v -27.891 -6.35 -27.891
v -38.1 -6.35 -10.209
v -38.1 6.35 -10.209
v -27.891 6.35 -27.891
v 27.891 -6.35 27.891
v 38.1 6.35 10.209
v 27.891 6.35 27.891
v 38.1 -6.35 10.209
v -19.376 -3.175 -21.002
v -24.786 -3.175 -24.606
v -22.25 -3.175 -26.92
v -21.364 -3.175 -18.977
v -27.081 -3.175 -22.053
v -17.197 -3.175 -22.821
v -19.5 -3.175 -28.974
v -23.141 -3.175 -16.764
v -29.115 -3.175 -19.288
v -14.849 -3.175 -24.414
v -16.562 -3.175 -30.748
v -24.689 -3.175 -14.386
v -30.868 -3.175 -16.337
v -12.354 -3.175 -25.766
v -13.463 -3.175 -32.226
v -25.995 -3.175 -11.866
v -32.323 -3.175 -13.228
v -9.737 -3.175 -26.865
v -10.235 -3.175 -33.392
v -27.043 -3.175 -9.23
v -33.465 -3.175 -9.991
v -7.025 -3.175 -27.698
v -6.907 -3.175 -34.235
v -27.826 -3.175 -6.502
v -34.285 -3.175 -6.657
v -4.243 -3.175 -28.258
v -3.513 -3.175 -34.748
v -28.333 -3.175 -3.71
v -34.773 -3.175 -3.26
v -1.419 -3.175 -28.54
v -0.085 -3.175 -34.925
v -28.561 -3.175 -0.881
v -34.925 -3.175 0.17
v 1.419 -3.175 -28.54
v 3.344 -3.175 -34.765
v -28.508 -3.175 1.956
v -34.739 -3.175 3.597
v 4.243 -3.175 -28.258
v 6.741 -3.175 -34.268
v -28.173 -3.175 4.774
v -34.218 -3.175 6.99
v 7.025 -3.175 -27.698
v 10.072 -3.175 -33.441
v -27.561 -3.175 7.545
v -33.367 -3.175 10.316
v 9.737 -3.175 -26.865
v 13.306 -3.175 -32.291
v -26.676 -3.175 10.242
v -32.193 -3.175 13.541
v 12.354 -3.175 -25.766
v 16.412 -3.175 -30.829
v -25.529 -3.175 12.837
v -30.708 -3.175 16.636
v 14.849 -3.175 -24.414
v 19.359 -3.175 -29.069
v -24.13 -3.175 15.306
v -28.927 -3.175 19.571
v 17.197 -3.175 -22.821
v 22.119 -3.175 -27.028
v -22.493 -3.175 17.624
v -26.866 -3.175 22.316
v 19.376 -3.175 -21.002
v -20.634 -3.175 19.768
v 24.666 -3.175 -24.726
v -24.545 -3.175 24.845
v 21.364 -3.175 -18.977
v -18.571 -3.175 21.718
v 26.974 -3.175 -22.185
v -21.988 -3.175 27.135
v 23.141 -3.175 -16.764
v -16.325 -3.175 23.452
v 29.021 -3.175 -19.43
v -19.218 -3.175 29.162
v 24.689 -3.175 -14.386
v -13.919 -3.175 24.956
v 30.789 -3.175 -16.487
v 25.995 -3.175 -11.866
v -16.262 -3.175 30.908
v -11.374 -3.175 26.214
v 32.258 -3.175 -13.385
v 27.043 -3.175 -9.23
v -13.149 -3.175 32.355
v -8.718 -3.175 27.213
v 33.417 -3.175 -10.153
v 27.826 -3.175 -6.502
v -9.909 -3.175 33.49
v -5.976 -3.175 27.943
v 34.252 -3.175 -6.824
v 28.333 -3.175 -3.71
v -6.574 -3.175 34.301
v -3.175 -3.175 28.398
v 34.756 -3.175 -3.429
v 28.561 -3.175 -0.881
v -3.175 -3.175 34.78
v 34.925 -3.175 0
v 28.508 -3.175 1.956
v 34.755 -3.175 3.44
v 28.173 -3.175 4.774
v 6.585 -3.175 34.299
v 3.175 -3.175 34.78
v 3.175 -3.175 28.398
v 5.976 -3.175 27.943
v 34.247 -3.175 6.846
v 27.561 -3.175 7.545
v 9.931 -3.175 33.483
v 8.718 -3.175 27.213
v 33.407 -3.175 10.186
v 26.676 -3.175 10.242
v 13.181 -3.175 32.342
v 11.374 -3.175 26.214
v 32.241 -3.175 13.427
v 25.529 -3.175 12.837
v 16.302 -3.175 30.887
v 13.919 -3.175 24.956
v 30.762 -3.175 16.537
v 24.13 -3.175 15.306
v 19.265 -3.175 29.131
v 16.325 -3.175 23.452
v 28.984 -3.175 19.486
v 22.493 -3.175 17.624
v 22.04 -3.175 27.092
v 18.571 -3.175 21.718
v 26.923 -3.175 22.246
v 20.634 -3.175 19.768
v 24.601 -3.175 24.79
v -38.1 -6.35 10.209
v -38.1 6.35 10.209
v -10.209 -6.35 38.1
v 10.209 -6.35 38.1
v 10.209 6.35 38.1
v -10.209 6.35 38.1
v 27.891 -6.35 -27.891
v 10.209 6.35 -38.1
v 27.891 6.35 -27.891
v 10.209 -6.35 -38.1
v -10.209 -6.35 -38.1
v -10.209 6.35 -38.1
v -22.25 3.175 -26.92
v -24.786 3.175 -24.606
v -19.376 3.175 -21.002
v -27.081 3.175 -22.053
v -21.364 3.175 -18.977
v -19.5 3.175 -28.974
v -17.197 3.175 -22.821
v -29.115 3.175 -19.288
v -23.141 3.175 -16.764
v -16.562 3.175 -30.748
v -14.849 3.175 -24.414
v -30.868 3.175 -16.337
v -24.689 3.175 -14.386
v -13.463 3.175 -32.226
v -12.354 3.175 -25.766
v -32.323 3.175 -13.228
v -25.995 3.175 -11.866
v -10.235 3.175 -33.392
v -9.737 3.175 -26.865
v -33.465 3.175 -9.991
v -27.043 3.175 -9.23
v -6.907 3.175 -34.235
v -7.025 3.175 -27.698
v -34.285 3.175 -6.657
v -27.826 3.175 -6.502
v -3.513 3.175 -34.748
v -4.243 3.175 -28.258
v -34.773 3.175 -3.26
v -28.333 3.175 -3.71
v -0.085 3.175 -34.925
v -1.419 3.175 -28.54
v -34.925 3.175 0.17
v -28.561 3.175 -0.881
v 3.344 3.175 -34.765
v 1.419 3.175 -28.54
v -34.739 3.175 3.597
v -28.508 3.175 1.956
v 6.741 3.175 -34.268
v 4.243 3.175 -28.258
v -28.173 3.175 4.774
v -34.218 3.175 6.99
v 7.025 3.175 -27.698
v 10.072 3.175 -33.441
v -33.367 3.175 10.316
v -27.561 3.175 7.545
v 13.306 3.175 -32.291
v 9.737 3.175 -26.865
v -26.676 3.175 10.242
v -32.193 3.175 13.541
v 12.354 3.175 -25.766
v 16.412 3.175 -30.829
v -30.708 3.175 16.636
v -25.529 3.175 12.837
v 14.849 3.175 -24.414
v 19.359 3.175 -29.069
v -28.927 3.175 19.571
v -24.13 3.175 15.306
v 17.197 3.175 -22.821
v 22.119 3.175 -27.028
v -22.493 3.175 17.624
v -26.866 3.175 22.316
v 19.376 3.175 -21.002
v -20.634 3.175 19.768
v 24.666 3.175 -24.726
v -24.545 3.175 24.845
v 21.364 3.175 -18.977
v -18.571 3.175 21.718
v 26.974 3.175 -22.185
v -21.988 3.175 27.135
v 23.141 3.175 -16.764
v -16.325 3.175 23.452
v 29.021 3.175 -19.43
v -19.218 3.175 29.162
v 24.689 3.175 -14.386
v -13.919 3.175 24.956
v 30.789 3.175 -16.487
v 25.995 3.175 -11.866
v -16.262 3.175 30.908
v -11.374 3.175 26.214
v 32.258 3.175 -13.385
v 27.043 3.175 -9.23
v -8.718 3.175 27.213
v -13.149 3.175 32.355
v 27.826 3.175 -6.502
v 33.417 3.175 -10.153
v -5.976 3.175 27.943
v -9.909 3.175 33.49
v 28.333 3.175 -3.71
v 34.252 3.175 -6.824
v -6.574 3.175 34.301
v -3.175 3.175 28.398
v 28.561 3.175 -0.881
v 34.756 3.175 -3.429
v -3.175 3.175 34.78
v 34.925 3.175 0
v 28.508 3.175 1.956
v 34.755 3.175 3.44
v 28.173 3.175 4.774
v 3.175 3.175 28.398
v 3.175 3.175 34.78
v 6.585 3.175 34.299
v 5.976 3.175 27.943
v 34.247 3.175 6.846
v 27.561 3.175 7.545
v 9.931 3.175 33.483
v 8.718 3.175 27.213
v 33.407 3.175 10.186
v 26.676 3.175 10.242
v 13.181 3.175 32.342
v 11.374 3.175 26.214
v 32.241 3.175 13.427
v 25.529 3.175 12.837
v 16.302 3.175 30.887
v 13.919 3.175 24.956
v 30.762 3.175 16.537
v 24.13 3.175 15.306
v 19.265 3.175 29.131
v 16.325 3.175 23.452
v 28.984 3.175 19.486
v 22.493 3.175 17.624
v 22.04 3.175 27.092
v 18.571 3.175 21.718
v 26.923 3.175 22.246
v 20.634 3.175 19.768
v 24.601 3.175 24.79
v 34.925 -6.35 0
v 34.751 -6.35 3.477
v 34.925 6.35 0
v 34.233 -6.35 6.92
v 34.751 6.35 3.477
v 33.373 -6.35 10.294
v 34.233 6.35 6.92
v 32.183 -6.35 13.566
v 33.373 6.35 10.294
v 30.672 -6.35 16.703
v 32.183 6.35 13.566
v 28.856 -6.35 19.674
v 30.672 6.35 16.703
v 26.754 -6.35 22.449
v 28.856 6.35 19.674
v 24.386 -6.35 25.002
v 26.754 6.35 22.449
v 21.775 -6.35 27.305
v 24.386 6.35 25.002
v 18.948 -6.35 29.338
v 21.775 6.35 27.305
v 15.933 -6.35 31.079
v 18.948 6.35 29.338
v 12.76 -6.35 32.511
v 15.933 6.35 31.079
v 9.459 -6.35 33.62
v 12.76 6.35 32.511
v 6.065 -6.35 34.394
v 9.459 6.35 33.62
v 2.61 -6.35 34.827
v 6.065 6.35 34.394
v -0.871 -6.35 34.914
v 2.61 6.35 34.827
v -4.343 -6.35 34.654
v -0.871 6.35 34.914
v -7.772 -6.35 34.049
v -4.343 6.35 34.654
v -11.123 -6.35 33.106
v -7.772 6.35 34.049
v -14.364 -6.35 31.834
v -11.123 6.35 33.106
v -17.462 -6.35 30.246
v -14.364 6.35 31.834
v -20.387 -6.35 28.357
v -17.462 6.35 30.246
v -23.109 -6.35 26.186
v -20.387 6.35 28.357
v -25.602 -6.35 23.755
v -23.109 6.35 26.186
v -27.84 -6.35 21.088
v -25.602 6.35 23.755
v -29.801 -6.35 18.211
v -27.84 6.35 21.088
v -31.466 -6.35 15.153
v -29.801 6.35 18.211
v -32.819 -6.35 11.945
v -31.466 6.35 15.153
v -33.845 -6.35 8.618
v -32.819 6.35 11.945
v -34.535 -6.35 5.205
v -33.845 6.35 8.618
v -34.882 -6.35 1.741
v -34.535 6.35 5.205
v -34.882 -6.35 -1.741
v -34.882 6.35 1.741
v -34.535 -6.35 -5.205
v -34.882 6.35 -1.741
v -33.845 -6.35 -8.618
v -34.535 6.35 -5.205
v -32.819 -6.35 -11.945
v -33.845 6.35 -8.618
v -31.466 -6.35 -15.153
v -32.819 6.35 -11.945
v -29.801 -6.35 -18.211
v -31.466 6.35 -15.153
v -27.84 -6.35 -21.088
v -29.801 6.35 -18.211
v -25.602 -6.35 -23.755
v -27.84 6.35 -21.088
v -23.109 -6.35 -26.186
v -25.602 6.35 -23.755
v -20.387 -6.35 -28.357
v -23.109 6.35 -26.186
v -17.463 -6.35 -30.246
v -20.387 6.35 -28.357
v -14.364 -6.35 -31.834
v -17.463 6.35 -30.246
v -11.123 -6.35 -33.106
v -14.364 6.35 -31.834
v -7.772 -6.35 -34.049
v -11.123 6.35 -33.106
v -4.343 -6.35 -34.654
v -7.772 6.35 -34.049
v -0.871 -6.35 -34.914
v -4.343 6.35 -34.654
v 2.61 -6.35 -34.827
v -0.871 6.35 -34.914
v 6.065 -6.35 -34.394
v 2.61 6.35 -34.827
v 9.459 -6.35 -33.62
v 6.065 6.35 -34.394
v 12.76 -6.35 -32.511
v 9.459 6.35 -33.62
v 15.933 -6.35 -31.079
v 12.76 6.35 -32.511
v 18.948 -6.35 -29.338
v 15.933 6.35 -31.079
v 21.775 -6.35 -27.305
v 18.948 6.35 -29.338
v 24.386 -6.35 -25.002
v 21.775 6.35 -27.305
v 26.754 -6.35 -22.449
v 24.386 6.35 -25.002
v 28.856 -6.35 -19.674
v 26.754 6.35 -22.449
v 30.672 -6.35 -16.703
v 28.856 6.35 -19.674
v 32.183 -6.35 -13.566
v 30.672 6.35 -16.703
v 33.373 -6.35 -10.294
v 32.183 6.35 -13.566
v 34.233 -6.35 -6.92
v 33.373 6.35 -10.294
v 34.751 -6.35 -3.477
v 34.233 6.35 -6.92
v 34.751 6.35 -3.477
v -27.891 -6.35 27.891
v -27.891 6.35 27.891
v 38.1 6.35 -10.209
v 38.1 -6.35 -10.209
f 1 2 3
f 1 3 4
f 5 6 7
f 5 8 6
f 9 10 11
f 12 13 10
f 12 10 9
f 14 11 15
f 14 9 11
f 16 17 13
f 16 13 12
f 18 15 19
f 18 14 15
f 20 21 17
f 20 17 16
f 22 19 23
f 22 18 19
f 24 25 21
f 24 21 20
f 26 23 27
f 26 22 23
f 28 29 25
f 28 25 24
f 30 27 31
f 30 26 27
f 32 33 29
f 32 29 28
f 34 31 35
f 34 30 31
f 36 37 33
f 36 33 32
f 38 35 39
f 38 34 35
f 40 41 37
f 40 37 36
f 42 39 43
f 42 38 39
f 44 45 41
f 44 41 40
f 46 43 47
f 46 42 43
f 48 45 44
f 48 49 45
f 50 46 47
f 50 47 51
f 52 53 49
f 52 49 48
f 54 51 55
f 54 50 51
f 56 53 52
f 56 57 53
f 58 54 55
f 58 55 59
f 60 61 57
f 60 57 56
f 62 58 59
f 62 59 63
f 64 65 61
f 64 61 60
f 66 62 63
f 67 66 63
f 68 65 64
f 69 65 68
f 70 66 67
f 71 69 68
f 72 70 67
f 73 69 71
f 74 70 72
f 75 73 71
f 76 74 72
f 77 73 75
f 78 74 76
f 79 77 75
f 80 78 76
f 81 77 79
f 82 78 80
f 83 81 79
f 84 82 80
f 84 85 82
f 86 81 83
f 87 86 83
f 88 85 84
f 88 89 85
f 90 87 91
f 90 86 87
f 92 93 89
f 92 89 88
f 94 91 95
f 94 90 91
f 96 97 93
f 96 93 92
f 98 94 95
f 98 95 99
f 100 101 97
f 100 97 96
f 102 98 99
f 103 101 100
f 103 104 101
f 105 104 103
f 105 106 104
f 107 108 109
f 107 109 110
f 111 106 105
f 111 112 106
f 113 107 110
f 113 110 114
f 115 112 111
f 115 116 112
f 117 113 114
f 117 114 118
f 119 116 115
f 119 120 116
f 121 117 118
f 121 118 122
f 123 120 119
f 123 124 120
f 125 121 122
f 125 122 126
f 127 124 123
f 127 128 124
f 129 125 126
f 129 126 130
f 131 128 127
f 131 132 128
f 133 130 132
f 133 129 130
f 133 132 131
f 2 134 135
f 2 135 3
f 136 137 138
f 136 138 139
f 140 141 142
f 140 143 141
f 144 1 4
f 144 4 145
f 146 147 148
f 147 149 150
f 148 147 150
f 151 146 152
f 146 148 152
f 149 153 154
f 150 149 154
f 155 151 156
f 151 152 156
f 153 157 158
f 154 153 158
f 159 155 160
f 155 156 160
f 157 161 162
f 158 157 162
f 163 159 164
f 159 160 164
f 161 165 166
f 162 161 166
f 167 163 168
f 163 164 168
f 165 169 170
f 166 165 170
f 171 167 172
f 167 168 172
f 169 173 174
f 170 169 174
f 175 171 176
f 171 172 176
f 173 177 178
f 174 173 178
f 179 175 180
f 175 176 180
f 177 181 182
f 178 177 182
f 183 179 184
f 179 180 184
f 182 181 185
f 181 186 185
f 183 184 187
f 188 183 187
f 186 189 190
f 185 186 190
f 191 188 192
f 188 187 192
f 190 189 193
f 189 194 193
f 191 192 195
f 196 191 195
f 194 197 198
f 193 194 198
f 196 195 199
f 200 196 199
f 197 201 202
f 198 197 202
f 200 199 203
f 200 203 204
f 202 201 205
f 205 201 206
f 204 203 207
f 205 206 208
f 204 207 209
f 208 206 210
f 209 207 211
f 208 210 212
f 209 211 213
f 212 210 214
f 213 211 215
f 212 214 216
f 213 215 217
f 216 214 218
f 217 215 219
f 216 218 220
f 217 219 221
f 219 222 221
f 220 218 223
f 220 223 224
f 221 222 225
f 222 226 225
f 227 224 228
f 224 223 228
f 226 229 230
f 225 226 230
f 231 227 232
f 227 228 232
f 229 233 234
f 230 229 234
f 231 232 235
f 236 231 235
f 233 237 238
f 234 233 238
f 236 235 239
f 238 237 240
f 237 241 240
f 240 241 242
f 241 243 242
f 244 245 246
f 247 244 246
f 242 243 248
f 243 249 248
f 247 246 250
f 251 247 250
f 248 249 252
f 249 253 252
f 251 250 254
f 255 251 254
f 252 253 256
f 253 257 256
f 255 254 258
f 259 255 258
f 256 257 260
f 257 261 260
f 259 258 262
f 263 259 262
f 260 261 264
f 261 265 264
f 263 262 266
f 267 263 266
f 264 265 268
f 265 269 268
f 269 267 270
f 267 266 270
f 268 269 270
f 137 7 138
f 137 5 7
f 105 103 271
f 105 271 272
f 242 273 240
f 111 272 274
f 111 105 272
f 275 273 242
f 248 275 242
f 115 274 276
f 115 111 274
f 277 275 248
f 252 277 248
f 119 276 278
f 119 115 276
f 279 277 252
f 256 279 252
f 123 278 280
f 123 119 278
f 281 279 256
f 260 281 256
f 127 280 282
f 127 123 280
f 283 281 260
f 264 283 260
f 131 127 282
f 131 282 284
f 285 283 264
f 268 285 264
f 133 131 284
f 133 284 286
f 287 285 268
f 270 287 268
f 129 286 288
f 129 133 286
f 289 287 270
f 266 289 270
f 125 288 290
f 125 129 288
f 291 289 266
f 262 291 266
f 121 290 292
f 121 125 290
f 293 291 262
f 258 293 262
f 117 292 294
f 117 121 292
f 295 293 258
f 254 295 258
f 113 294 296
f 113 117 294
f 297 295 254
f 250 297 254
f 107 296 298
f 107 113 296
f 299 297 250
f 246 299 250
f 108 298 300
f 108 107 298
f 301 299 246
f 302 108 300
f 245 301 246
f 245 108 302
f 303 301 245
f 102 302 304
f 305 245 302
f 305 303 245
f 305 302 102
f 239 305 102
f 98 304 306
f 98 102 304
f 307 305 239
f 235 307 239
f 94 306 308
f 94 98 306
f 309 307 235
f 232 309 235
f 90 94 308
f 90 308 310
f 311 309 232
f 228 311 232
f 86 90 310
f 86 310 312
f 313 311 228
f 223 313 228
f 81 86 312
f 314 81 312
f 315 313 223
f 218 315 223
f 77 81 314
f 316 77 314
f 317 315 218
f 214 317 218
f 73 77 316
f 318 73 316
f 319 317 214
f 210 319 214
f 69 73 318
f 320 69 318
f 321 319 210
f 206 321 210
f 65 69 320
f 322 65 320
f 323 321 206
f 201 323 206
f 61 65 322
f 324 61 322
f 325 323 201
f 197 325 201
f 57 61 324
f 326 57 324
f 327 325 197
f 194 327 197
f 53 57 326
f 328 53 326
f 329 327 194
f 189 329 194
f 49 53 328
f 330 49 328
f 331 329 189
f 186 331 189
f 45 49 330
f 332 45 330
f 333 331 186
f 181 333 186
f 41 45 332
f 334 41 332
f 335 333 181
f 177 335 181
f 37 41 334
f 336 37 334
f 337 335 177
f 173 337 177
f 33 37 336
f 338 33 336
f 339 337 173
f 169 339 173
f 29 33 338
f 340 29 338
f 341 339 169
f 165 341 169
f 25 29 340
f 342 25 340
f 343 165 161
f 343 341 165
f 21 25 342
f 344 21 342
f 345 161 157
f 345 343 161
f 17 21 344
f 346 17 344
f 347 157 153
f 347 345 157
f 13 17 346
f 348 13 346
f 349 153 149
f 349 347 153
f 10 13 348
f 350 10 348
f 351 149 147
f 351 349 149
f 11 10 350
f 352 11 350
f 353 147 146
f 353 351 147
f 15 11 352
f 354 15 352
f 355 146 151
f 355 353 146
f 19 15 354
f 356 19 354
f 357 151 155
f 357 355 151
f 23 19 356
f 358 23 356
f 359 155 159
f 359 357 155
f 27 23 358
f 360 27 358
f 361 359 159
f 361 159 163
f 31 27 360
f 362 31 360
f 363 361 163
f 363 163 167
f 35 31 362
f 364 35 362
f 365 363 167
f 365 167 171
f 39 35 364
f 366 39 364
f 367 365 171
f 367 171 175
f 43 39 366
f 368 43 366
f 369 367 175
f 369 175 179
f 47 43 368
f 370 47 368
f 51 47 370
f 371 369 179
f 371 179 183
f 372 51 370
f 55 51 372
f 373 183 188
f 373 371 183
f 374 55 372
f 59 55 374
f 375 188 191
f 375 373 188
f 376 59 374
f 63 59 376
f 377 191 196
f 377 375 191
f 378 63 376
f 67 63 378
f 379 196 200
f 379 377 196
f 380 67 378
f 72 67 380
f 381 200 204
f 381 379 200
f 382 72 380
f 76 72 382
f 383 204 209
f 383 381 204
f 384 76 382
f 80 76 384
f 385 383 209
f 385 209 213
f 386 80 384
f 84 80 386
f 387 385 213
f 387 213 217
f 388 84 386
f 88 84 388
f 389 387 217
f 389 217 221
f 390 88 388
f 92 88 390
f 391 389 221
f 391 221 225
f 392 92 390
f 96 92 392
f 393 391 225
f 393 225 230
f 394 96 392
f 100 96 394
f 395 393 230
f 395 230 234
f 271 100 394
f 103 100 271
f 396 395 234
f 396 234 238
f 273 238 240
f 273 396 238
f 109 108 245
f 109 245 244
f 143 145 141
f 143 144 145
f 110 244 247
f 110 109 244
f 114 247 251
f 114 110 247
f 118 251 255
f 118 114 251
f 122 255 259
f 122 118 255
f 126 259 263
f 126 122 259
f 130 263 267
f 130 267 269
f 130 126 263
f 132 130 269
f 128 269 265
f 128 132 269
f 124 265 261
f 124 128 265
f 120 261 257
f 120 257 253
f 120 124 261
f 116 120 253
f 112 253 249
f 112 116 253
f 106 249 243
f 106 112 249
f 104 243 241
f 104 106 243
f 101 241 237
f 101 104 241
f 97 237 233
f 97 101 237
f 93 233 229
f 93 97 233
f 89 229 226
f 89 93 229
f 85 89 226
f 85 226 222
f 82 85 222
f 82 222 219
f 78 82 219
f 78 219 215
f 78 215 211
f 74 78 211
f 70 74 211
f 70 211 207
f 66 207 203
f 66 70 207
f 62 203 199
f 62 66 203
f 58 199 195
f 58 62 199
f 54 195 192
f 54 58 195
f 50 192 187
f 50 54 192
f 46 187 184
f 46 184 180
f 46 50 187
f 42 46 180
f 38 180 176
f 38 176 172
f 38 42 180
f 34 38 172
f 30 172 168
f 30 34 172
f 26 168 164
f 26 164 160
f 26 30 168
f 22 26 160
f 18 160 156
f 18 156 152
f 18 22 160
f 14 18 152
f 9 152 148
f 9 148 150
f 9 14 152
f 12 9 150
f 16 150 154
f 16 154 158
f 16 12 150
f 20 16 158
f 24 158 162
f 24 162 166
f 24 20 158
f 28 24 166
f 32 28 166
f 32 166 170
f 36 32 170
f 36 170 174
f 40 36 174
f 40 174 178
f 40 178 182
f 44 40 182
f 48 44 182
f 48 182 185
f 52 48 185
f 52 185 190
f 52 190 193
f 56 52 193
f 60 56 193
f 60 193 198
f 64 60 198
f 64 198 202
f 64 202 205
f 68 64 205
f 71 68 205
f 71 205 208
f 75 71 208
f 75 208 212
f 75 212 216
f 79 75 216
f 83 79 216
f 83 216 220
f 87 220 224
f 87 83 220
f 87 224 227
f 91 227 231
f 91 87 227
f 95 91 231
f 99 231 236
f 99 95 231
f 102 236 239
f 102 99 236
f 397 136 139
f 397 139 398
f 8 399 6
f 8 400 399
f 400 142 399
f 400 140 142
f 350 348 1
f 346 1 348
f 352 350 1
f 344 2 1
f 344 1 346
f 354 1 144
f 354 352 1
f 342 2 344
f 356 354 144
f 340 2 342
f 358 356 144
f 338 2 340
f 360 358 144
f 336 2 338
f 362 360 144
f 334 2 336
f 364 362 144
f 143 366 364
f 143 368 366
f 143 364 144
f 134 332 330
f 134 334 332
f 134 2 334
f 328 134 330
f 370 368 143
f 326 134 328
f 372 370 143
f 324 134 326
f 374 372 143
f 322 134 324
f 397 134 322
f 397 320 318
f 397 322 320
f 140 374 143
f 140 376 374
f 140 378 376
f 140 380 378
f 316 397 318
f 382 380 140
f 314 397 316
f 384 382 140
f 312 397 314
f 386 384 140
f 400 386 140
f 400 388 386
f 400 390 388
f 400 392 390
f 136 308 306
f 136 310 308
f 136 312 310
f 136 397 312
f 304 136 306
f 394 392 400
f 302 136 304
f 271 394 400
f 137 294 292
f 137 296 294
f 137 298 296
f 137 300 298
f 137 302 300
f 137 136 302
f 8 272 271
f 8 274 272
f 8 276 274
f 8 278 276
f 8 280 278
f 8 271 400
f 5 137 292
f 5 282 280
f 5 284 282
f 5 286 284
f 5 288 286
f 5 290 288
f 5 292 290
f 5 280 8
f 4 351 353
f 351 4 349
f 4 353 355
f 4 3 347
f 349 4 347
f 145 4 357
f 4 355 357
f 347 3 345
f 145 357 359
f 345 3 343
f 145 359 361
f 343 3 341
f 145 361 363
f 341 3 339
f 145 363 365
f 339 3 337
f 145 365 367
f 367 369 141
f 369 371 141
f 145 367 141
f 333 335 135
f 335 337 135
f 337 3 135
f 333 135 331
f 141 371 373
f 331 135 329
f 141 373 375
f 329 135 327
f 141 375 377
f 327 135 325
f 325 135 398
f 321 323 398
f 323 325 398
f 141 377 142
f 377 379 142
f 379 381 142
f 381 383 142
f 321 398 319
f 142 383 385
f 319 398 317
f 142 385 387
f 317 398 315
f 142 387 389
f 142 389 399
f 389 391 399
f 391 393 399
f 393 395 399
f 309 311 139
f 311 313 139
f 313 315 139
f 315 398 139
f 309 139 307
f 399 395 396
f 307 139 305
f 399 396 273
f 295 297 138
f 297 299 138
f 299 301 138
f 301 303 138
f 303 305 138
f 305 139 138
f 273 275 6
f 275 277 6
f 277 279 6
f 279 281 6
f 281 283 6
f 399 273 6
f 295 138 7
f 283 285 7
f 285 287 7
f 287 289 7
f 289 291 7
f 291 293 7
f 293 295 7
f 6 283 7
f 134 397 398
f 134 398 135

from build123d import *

# Parameters (mm, degrees)
F0_R     = 34.925
F1_DEPTH = 6.35
F3_DEPTH = 3.175


with BuildPart() as f1:
    # F0 (on Front) → F1 (new body, symmetric)
    with BuildSketch(Plane.XZ):
        Polygon((27.8911357684, 27.8911357684), (10.2088642316, 38.1), (-10.2088642316, 38.1), (-27.8911357684, 27.8911357684), (-38.1, 10.2088642316), (-38.1, -10.2088642316), (-27.8911357684, -27.8911357684), (-10.2088642316, -38.1), (10.2088642316, -38.1), (27.8911357684, -27.8911357684), (38.1, -10.2088642316), (38.1, 10.2088642316), align=None)
        Circle(F0_R, mode=Mode.SUBTRACT)
    extrude(amount=F1_DEPTH, both=True)

    # F2 (on Front) → F3 (join, symmetric)
    with BuildSketch(Plane.XZ):
        with BuildLine():
            Line((-3.175, 28.3980633142), (-3.175, 34.7803824016))
            ThreePointArc((-3.175, 34.7803824016), (0, -34.925), (3.175, 34.7803824016))
            Line((3.175, 34.7803824016), (3.175, 28.3980633142))
            ThreePointArc((3.175, 28.3980633142), (0, -28.575), (-3.175, 28.3980633142))
        make_face()
    extrude(amount=F3_DEPTH, both=True)


solid = f1.part
